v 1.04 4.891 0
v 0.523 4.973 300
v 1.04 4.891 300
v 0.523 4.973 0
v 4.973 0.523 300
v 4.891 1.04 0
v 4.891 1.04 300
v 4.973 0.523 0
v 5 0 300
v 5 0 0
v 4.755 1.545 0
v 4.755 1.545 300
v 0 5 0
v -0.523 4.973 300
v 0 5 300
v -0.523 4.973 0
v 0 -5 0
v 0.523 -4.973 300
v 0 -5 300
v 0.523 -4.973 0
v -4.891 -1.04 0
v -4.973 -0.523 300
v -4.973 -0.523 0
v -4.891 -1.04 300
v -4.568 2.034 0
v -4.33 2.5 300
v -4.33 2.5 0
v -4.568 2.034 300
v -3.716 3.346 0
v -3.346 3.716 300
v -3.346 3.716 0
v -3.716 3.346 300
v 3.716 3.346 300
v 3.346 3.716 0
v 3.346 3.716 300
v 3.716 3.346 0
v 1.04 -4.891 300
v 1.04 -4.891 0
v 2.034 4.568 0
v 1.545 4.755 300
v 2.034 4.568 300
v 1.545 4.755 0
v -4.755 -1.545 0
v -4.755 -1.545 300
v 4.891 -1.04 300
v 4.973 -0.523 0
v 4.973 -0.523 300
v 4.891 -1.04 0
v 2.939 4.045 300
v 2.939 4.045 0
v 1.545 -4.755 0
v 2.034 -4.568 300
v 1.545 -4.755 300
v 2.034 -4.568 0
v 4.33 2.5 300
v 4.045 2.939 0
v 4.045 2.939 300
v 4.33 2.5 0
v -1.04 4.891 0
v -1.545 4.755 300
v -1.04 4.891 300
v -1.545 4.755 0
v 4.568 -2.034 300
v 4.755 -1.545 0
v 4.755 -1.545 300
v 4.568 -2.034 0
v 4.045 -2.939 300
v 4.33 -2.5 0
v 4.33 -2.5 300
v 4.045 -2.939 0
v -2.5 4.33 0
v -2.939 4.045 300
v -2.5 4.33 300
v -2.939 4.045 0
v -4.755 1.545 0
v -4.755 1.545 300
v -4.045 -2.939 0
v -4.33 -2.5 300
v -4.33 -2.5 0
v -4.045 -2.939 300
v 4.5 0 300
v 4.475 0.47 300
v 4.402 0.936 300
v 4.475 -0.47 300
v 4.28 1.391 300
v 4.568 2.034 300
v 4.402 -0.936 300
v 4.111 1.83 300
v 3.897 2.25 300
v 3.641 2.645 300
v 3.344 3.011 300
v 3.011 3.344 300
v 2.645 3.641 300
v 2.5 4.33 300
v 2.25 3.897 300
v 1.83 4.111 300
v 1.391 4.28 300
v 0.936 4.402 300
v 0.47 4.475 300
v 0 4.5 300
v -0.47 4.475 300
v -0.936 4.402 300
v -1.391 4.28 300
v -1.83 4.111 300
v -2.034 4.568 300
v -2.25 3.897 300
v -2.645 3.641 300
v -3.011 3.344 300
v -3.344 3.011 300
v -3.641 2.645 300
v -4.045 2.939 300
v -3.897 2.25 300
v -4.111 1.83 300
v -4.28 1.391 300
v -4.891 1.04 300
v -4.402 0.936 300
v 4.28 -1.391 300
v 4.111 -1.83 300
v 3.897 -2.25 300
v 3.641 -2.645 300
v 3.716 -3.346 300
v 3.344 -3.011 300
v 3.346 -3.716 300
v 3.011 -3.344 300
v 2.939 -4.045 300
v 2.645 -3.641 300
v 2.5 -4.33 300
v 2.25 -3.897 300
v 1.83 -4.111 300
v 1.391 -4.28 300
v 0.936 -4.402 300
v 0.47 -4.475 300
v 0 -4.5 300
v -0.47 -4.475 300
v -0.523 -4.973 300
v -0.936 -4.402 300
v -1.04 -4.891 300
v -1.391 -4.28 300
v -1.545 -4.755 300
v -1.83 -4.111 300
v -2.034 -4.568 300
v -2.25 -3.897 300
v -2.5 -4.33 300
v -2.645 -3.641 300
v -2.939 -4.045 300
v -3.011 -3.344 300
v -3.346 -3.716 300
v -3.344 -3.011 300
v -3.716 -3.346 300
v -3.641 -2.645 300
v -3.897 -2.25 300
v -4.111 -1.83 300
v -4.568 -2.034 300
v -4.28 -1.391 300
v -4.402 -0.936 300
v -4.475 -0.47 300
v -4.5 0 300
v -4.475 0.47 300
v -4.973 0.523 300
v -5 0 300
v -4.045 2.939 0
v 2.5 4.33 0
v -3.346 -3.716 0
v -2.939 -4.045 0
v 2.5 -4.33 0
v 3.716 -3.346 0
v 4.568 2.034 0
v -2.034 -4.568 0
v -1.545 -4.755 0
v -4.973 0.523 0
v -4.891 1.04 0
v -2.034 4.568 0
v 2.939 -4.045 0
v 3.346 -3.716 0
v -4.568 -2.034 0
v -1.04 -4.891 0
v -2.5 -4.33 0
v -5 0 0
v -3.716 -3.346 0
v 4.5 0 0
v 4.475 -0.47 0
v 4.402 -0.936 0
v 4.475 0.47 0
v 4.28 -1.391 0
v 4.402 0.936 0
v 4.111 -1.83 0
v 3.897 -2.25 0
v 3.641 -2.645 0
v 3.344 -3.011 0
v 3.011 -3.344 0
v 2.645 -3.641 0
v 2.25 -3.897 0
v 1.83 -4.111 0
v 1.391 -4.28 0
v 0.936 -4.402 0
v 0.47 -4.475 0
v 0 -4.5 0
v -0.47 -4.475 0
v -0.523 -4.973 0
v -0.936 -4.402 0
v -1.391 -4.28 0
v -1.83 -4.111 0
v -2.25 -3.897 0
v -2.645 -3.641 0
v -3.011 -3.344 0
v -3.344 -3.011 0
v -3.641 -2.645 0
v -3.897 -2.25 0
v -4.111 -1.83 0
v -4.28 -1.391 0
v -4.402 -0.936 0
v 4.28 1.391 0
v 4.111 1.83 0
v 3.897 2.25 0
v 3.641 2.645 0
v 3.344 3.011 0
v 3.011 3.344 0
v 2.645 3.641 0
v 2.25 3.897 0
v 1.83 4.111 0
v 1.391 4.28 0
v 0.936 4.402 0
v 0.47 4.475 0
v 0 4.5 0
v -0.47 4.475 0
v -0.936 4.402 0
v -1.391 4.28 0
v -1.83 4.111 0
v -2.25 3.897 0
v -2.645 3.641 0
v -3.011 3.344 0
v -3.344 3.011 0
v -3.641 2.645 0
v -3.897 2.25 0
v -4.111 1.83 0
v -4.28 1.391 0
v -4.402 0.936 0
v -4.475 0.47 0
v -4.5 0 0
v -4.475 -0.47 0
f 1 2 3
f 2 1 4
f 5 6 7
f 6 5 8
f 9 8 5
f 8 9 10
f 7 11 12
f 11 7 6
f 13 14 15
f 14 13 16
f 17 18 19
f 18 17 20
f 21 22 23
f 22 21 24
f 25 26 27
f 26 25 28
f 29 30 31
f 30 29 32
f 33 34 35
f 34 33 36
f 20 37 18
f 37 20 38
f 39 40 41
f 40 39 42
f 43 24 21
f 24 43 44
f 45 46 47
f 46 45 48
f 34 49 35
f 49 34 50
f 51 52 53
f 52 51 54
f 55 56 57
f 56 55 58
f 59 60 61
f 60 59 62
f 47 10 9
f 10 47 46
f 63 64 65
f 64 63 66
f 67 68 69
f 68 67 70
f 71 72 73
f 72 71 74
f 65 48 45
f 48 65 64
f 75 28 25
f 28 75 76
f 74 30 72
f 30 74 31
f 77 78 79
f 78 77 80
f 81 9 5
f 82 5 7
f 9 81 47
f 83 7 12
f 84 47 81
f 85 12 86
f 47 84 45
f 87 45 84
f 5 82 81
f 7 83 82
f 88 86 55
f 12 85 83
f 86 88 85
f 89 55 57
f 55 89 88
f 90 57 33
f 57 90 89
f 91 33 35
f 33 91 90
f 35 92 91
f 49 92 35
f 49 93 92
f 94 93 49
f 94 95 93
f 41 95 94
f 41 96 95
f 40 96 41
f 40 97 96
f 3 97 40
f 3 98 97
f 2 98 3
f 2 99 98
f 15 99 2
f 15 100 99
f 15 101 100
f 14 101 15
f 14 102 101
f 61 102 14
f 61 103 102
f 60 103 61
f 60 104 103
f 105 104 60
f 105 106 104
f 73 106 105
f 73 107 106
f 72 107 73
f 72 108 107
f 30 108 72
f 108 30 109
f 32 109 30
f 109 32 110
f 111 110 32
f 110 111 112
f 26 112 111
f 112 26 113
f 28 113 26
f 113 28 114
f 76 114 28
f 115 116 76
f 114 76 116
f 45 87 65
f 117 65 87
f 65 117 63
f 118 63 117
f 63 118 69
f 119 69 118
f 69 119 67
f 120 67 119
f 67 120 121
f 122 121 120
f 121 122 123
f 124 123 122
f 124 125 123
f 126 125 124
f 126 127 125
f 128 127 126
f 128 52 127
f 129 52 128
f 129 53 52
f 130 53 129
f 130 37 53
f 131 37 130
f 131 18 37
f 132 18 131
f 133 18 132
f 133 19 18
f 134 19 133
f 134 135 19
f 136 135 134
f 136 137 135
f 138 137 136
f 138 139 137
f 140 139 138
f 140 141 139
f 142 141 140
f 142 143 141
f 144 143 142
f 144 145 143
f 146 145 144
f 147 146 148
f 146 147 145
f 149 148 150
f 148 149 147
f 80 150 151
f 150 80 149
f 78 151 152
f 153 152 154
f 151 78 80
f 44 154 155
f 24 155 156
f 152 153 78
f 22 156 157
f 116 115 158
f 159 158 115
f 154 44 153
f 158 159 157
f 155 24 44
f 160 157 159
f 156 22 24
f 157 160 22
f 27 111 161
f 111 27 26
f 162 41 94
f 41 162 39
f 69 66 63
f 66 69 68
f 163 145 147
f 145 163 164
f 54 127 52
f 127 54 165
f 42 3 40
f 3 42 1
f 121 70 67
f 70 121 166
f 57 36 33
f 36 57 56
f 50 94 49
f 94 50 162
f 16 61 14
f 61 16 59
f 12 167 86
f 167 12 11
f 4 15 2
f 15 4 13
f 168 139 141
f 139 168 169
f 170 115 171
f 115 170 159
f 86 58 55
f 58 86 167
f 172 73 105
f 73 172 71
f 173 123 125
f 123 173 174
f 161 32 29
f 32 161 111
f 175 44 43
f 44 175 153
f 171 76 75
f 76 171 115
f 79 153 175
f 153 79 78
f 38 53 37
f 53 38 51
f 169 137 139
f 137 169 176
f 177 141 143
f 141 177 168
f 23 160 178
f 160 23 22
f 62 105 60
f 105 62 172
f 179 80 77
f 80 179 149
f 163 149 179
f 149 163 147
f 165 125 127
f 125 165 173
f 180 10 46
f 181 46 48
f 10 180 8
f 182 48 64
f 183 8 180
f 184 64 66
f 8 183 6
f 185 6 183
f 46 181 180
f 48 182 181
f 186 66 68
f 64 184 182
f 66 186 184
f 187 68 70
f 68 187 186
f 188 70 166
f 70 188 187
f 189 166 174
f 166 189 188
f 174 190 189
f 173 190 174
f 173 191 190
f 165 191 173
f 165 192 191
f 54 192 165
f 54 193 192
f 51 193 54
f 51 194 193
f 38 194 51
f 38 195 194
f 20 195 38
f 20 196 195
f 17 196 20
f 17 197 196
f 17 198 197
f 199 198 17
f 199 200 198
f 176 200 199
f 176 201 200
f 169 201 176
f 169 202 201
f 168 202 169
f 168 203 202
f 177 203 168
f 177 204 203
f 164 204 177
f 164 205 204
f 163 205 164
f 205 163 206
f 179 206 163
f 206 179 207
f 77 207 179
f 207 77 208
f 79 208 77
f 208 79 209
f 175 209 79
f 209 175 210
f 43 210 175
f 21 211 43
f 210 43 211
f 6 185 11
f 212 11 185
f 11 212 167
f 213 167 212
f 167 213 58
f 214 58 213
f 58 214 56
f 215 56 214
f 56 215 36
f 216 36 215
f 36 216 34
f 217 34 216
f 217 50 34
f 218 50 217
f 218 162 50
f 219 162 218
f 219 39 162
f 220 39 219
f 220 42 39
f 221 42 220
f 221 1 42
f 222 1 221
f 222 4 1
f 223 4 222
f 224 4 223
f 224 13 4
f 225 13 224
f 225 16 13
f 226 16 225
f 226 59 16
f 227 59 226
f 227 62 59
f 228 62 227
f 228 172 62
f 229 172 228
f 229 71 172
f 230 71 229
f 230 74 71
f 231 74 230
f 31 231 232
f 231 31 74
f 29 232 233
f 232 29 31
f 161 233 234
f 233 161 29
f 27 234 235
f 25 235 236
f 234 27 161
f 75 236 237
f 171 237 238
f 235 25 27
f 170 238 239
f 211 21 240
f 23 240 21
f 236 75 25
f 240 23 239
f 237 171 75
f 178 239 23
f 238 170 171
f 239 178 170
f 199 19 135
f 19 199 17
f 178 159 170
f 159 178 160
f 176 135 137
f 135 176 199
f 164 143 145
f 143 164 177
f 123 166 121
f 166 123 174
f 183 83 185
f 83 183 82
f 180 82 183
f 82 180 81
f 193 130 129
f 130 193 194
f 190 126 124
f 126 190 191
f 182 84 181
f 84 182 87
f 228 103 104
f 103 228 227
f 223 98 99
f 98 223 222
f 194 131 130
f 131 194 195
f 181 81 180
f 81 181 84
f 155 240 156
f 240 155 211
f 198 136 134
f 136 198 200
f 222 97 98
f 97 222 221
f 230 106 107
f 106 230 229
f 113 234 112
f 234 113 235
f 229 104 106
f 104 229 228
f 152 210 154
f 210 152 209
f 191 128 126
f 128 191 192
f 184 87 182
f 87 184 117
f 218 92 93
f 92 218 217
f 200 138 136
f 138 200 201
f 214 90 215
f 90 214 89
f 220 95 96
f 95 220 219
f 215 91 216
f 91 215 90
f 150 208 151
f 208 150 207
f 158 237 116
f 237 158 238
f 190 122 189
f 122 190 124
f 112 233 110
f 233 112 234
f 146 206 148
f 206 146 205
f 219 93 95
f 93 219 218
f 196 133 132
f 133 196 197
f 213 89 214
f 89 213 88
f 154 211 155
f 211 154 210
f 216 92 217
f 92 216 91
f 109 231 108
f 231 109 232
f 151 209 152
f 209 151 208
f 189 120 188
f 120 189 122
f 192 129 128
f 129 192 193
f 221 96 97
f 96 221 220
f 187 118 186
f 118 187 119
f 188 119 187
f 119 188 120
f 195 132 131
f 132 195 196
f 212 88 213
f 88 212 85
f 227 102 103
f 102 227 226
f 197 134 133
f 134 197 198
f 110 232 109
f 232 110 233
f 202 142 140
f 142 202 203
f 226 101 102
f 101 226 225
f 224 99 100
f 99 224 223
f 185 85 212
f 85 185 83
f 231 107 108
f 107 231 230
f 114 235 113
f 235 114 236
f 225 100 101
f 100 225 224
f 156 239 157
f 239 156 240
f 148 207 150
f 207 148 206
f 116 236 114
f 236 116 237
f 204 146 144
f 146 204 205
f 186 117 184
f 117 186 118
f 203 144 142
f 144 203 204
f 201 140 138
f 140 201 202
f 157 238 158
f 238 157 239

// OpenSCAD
// file: _params.scad
// =========================================================================
// 공유 파라미터 (모든 개별 부품 파일에서 include)
// 메인 어셈블리: cup_z_x_catrage_frame_water_mic_anti_3030.scad 에서 추출
// 프레임: 600 × 420 × 700mm (3030 프로파일, Y=0 대칭)
// =========================================================================

$fn = 60;  // 부품 출력용 고해상도
GLOBAL_TOLERANCE = 0.2;

// --- [1] 하부 기성품 및 원통 파라미터 ---
X_RAIL_LEN = 290.0;
X_BLOCK_W = 42.0; X_BLOCK_L = 59.0;
X_PITCH_X = 20.0; X_PITCH_Y = 32.0;
X_RAIL_W = 40.0;  X_RAIL_H = 30.0;

MOTOR_W = 42.0;      MOTOR_PITCH = 31.0; MOTOR_HOLE_D = 3.5;    
MOTOR_BOSS_D = 22.0; MOTOR_BOSS_H = 2.0; SCREW_D = 8.0;         

CUP_ID = 100.0;  CUP_WALL = 5.0; CUP_OD = 110.0;     // 아크릴 원통 OD110/ID100
CUP_H = 180.0;   CAGE_H = 60.0;  FLOOR_H = 10.0; PISTON_H = 20.0;     

LIP_D = 30.0;    LIP_H = 5.0;    LEAK_DRAIN_D = 4.0;    
GUIDE_PIPE_D = 10.0; BUSHING_OD = 12.0; BUSHING_H = 8.0;       
DRAIN_RADIUS = 35.0; DRAIN_D = 10.0;        

Y_OFFSET = 85.0; BRKT_H = 12.0; BRKT_D = 122.0; BRKT_ID = 62.0; Z_MOUNT_PCD = 86.0;   

// --- [2] 아크릴 파이프 및 상부 카트리지 ---
ACRYL_ID = 100.0; ACRYL_T = 5.0; ACRYL_OD = ACRYL_ID + (ACRYL_T * 2);  // OD110 (아크릴집 106 재고없음 → 컵과 동일 규격)

REVOLVER_PCD = 240.0;     // 인접 카트리지 웹 9.8mm 확보 (OD110 대응, 230→240)
CARTRIDGE_OD = REVOLVER_PCD + ACRYL_OD + 8; 
TOP_PLATE_H = 15.0;       // 아크릴 15T 통판 (보스홀 단 깊이 10mm)

HUB_D = 60.0;            
SHAFT_D = 12.0;          
HUB_WALL = 4.0;          
HUB_H = 15.0;             // 아크릴 5T × 3장 적층 — 파이프 130mm 대응
POCKET_DEPTH = 5.0;
MID_HUB_Z = 68.5;          // 중단 허브 하면 Z (FLOAT_H=2 보정, 절대좌표 유지)
UPPER_HUB_Z = 135.0;       // 상단 허브 하면 Z (전체 135+15=150 유지)
BOSS_OD = 35.0;
BOSS_H = 11.0;             // 보스11 + 와셔1 = 12, 리세스10 → 허브 2mm 공중

// --- [3] GT2 벨트 구동 시스템 ---
GT2_PITCH     = 2.0;
GT2_BELT_W    = 6.0;
BIG_PULLEY_TEETH = 566;
BIG_PULLEY_PD = BIG_PULLEY_TEETH * GT2_PITCH / PI;
BIG_PULLEY_OD = BIG_PULLEY_PD + 1.0;
SMALL_PULLEY_TEETH = 20;
SMALL_PULLEY_PD = SMALL_PULLEY_TEETH * GT2_PITCH / PI;
SMALL_PULLEY_OD = SMALL_PULLEY_PD + 1.0;

BELT_MOTOR_X = -300;
BELT_MOTOR_Y = -155.5;
BRKT_MOTOR_H = 25.0;
BRKT_MOTOR_W = 45.0;
SLOT_LEN = 10.0;
FLAG_W = 15.0;  FLAG_H = 8.0;  FLAG_T = 1.5;

X_POS_MEASURE = 170.0;   // X_M~X_R 정중앙, X대칭

// --- [4] 3030 프레임 경계 (600×430×700mm) ---
PF = 30;             // 3030 알루미늄 프로파일
WASHER_T = 1.0;     

X_L = -320;
X_M = 60;
X_R = 250;
Y_F = -210;          // 전방 (대칭: -210+30=-180, Y=0 중심)
Y_B = 180;           // 후방 (대칭: 180+30=210, Y=0 중심) — 메인파일과 동기화

Z_BOT = -480;
Z_RAIL = -322;
Z_MID = -TOP_PLATE_H - PF;
Z_TOP = 220;

SUPPORT_PILLAR_H = Z_TOP - PF;

SHAFT_SQ = 20;       // 2020 사각 회전축

// 사각 축 홀 크기
SQ = SHAFT_SQ + GLOBAL_TOLERANCE;  // 20.2mm

// --- 리볼버/컵 축 정렬 (보스홀=판 중심에 리볼버 정렬) ---
REVOLVER_CX = (X_L + X_M + PF)/2;        // 판 중심 = 보스홀 = 리볼버 회전축 (-115)
DROP_X      = REVOLVER_CX + REVOLVER_PCD/2;  // 링 드롭 / 컵 적재 축 (+5)

// --- [5] 모터 체결홀 (베이스 플레이트 ↔ 모터 브래킷 슬롯 공유) ---
MOTOR_BOLT_PITCH    = 25;        // Y피치 (모터축 기준 ±12.5)
MOTOR_BOLT_X_NOMINAL = X_L + 55; // 1열: 판 좌단 55 (모터 기본 위치)
MOTOR_BOLT_X_SHIFT   = X_L + 40; // 2열: 판 좌단 40 (모터 좌측 이동 대비)

// 모터 마운트 볼트 카운터보어 (단볼트용 — 브래킷 두께 25 중 깊게 파냄)
MOTOR_CB_D     = 6.5;            // M3 캡볼트 머리 클리어런스
MOTOR_CB_DEPTH = 19;             // 카운터보어 깊이 (잔여 통과 6mm → M3×10 단볼트)
// main file
// =========================================================================
// [구매] 배수 및 가이드 알루미늄 파이프 × 1
// 구매: 알루미늄 원형 튜브 ø10 × 0.5T × 300mm (내경 ø9.0)
// 역할: 피스톤의 회전을 억제하는 가이드 및 피스톤 내부 물을 배출하는 통로
// =========================================================================
include <_params.scad>

color([0.55, 0.57, 0.6, 1.0]) {
    difference() {
        // 알루미늄 파이프 외경 (ø10)
        cylinder(d = GUIDE_PIPE_D, h = 300);
        // 내경 관통 (두께 0.5T 이므로 내경 ø9.0)
        translate([0, 0, -1])
            cylinder(d = GUIDE_PIPE_D - 1.0, h = 302);
    }
}
